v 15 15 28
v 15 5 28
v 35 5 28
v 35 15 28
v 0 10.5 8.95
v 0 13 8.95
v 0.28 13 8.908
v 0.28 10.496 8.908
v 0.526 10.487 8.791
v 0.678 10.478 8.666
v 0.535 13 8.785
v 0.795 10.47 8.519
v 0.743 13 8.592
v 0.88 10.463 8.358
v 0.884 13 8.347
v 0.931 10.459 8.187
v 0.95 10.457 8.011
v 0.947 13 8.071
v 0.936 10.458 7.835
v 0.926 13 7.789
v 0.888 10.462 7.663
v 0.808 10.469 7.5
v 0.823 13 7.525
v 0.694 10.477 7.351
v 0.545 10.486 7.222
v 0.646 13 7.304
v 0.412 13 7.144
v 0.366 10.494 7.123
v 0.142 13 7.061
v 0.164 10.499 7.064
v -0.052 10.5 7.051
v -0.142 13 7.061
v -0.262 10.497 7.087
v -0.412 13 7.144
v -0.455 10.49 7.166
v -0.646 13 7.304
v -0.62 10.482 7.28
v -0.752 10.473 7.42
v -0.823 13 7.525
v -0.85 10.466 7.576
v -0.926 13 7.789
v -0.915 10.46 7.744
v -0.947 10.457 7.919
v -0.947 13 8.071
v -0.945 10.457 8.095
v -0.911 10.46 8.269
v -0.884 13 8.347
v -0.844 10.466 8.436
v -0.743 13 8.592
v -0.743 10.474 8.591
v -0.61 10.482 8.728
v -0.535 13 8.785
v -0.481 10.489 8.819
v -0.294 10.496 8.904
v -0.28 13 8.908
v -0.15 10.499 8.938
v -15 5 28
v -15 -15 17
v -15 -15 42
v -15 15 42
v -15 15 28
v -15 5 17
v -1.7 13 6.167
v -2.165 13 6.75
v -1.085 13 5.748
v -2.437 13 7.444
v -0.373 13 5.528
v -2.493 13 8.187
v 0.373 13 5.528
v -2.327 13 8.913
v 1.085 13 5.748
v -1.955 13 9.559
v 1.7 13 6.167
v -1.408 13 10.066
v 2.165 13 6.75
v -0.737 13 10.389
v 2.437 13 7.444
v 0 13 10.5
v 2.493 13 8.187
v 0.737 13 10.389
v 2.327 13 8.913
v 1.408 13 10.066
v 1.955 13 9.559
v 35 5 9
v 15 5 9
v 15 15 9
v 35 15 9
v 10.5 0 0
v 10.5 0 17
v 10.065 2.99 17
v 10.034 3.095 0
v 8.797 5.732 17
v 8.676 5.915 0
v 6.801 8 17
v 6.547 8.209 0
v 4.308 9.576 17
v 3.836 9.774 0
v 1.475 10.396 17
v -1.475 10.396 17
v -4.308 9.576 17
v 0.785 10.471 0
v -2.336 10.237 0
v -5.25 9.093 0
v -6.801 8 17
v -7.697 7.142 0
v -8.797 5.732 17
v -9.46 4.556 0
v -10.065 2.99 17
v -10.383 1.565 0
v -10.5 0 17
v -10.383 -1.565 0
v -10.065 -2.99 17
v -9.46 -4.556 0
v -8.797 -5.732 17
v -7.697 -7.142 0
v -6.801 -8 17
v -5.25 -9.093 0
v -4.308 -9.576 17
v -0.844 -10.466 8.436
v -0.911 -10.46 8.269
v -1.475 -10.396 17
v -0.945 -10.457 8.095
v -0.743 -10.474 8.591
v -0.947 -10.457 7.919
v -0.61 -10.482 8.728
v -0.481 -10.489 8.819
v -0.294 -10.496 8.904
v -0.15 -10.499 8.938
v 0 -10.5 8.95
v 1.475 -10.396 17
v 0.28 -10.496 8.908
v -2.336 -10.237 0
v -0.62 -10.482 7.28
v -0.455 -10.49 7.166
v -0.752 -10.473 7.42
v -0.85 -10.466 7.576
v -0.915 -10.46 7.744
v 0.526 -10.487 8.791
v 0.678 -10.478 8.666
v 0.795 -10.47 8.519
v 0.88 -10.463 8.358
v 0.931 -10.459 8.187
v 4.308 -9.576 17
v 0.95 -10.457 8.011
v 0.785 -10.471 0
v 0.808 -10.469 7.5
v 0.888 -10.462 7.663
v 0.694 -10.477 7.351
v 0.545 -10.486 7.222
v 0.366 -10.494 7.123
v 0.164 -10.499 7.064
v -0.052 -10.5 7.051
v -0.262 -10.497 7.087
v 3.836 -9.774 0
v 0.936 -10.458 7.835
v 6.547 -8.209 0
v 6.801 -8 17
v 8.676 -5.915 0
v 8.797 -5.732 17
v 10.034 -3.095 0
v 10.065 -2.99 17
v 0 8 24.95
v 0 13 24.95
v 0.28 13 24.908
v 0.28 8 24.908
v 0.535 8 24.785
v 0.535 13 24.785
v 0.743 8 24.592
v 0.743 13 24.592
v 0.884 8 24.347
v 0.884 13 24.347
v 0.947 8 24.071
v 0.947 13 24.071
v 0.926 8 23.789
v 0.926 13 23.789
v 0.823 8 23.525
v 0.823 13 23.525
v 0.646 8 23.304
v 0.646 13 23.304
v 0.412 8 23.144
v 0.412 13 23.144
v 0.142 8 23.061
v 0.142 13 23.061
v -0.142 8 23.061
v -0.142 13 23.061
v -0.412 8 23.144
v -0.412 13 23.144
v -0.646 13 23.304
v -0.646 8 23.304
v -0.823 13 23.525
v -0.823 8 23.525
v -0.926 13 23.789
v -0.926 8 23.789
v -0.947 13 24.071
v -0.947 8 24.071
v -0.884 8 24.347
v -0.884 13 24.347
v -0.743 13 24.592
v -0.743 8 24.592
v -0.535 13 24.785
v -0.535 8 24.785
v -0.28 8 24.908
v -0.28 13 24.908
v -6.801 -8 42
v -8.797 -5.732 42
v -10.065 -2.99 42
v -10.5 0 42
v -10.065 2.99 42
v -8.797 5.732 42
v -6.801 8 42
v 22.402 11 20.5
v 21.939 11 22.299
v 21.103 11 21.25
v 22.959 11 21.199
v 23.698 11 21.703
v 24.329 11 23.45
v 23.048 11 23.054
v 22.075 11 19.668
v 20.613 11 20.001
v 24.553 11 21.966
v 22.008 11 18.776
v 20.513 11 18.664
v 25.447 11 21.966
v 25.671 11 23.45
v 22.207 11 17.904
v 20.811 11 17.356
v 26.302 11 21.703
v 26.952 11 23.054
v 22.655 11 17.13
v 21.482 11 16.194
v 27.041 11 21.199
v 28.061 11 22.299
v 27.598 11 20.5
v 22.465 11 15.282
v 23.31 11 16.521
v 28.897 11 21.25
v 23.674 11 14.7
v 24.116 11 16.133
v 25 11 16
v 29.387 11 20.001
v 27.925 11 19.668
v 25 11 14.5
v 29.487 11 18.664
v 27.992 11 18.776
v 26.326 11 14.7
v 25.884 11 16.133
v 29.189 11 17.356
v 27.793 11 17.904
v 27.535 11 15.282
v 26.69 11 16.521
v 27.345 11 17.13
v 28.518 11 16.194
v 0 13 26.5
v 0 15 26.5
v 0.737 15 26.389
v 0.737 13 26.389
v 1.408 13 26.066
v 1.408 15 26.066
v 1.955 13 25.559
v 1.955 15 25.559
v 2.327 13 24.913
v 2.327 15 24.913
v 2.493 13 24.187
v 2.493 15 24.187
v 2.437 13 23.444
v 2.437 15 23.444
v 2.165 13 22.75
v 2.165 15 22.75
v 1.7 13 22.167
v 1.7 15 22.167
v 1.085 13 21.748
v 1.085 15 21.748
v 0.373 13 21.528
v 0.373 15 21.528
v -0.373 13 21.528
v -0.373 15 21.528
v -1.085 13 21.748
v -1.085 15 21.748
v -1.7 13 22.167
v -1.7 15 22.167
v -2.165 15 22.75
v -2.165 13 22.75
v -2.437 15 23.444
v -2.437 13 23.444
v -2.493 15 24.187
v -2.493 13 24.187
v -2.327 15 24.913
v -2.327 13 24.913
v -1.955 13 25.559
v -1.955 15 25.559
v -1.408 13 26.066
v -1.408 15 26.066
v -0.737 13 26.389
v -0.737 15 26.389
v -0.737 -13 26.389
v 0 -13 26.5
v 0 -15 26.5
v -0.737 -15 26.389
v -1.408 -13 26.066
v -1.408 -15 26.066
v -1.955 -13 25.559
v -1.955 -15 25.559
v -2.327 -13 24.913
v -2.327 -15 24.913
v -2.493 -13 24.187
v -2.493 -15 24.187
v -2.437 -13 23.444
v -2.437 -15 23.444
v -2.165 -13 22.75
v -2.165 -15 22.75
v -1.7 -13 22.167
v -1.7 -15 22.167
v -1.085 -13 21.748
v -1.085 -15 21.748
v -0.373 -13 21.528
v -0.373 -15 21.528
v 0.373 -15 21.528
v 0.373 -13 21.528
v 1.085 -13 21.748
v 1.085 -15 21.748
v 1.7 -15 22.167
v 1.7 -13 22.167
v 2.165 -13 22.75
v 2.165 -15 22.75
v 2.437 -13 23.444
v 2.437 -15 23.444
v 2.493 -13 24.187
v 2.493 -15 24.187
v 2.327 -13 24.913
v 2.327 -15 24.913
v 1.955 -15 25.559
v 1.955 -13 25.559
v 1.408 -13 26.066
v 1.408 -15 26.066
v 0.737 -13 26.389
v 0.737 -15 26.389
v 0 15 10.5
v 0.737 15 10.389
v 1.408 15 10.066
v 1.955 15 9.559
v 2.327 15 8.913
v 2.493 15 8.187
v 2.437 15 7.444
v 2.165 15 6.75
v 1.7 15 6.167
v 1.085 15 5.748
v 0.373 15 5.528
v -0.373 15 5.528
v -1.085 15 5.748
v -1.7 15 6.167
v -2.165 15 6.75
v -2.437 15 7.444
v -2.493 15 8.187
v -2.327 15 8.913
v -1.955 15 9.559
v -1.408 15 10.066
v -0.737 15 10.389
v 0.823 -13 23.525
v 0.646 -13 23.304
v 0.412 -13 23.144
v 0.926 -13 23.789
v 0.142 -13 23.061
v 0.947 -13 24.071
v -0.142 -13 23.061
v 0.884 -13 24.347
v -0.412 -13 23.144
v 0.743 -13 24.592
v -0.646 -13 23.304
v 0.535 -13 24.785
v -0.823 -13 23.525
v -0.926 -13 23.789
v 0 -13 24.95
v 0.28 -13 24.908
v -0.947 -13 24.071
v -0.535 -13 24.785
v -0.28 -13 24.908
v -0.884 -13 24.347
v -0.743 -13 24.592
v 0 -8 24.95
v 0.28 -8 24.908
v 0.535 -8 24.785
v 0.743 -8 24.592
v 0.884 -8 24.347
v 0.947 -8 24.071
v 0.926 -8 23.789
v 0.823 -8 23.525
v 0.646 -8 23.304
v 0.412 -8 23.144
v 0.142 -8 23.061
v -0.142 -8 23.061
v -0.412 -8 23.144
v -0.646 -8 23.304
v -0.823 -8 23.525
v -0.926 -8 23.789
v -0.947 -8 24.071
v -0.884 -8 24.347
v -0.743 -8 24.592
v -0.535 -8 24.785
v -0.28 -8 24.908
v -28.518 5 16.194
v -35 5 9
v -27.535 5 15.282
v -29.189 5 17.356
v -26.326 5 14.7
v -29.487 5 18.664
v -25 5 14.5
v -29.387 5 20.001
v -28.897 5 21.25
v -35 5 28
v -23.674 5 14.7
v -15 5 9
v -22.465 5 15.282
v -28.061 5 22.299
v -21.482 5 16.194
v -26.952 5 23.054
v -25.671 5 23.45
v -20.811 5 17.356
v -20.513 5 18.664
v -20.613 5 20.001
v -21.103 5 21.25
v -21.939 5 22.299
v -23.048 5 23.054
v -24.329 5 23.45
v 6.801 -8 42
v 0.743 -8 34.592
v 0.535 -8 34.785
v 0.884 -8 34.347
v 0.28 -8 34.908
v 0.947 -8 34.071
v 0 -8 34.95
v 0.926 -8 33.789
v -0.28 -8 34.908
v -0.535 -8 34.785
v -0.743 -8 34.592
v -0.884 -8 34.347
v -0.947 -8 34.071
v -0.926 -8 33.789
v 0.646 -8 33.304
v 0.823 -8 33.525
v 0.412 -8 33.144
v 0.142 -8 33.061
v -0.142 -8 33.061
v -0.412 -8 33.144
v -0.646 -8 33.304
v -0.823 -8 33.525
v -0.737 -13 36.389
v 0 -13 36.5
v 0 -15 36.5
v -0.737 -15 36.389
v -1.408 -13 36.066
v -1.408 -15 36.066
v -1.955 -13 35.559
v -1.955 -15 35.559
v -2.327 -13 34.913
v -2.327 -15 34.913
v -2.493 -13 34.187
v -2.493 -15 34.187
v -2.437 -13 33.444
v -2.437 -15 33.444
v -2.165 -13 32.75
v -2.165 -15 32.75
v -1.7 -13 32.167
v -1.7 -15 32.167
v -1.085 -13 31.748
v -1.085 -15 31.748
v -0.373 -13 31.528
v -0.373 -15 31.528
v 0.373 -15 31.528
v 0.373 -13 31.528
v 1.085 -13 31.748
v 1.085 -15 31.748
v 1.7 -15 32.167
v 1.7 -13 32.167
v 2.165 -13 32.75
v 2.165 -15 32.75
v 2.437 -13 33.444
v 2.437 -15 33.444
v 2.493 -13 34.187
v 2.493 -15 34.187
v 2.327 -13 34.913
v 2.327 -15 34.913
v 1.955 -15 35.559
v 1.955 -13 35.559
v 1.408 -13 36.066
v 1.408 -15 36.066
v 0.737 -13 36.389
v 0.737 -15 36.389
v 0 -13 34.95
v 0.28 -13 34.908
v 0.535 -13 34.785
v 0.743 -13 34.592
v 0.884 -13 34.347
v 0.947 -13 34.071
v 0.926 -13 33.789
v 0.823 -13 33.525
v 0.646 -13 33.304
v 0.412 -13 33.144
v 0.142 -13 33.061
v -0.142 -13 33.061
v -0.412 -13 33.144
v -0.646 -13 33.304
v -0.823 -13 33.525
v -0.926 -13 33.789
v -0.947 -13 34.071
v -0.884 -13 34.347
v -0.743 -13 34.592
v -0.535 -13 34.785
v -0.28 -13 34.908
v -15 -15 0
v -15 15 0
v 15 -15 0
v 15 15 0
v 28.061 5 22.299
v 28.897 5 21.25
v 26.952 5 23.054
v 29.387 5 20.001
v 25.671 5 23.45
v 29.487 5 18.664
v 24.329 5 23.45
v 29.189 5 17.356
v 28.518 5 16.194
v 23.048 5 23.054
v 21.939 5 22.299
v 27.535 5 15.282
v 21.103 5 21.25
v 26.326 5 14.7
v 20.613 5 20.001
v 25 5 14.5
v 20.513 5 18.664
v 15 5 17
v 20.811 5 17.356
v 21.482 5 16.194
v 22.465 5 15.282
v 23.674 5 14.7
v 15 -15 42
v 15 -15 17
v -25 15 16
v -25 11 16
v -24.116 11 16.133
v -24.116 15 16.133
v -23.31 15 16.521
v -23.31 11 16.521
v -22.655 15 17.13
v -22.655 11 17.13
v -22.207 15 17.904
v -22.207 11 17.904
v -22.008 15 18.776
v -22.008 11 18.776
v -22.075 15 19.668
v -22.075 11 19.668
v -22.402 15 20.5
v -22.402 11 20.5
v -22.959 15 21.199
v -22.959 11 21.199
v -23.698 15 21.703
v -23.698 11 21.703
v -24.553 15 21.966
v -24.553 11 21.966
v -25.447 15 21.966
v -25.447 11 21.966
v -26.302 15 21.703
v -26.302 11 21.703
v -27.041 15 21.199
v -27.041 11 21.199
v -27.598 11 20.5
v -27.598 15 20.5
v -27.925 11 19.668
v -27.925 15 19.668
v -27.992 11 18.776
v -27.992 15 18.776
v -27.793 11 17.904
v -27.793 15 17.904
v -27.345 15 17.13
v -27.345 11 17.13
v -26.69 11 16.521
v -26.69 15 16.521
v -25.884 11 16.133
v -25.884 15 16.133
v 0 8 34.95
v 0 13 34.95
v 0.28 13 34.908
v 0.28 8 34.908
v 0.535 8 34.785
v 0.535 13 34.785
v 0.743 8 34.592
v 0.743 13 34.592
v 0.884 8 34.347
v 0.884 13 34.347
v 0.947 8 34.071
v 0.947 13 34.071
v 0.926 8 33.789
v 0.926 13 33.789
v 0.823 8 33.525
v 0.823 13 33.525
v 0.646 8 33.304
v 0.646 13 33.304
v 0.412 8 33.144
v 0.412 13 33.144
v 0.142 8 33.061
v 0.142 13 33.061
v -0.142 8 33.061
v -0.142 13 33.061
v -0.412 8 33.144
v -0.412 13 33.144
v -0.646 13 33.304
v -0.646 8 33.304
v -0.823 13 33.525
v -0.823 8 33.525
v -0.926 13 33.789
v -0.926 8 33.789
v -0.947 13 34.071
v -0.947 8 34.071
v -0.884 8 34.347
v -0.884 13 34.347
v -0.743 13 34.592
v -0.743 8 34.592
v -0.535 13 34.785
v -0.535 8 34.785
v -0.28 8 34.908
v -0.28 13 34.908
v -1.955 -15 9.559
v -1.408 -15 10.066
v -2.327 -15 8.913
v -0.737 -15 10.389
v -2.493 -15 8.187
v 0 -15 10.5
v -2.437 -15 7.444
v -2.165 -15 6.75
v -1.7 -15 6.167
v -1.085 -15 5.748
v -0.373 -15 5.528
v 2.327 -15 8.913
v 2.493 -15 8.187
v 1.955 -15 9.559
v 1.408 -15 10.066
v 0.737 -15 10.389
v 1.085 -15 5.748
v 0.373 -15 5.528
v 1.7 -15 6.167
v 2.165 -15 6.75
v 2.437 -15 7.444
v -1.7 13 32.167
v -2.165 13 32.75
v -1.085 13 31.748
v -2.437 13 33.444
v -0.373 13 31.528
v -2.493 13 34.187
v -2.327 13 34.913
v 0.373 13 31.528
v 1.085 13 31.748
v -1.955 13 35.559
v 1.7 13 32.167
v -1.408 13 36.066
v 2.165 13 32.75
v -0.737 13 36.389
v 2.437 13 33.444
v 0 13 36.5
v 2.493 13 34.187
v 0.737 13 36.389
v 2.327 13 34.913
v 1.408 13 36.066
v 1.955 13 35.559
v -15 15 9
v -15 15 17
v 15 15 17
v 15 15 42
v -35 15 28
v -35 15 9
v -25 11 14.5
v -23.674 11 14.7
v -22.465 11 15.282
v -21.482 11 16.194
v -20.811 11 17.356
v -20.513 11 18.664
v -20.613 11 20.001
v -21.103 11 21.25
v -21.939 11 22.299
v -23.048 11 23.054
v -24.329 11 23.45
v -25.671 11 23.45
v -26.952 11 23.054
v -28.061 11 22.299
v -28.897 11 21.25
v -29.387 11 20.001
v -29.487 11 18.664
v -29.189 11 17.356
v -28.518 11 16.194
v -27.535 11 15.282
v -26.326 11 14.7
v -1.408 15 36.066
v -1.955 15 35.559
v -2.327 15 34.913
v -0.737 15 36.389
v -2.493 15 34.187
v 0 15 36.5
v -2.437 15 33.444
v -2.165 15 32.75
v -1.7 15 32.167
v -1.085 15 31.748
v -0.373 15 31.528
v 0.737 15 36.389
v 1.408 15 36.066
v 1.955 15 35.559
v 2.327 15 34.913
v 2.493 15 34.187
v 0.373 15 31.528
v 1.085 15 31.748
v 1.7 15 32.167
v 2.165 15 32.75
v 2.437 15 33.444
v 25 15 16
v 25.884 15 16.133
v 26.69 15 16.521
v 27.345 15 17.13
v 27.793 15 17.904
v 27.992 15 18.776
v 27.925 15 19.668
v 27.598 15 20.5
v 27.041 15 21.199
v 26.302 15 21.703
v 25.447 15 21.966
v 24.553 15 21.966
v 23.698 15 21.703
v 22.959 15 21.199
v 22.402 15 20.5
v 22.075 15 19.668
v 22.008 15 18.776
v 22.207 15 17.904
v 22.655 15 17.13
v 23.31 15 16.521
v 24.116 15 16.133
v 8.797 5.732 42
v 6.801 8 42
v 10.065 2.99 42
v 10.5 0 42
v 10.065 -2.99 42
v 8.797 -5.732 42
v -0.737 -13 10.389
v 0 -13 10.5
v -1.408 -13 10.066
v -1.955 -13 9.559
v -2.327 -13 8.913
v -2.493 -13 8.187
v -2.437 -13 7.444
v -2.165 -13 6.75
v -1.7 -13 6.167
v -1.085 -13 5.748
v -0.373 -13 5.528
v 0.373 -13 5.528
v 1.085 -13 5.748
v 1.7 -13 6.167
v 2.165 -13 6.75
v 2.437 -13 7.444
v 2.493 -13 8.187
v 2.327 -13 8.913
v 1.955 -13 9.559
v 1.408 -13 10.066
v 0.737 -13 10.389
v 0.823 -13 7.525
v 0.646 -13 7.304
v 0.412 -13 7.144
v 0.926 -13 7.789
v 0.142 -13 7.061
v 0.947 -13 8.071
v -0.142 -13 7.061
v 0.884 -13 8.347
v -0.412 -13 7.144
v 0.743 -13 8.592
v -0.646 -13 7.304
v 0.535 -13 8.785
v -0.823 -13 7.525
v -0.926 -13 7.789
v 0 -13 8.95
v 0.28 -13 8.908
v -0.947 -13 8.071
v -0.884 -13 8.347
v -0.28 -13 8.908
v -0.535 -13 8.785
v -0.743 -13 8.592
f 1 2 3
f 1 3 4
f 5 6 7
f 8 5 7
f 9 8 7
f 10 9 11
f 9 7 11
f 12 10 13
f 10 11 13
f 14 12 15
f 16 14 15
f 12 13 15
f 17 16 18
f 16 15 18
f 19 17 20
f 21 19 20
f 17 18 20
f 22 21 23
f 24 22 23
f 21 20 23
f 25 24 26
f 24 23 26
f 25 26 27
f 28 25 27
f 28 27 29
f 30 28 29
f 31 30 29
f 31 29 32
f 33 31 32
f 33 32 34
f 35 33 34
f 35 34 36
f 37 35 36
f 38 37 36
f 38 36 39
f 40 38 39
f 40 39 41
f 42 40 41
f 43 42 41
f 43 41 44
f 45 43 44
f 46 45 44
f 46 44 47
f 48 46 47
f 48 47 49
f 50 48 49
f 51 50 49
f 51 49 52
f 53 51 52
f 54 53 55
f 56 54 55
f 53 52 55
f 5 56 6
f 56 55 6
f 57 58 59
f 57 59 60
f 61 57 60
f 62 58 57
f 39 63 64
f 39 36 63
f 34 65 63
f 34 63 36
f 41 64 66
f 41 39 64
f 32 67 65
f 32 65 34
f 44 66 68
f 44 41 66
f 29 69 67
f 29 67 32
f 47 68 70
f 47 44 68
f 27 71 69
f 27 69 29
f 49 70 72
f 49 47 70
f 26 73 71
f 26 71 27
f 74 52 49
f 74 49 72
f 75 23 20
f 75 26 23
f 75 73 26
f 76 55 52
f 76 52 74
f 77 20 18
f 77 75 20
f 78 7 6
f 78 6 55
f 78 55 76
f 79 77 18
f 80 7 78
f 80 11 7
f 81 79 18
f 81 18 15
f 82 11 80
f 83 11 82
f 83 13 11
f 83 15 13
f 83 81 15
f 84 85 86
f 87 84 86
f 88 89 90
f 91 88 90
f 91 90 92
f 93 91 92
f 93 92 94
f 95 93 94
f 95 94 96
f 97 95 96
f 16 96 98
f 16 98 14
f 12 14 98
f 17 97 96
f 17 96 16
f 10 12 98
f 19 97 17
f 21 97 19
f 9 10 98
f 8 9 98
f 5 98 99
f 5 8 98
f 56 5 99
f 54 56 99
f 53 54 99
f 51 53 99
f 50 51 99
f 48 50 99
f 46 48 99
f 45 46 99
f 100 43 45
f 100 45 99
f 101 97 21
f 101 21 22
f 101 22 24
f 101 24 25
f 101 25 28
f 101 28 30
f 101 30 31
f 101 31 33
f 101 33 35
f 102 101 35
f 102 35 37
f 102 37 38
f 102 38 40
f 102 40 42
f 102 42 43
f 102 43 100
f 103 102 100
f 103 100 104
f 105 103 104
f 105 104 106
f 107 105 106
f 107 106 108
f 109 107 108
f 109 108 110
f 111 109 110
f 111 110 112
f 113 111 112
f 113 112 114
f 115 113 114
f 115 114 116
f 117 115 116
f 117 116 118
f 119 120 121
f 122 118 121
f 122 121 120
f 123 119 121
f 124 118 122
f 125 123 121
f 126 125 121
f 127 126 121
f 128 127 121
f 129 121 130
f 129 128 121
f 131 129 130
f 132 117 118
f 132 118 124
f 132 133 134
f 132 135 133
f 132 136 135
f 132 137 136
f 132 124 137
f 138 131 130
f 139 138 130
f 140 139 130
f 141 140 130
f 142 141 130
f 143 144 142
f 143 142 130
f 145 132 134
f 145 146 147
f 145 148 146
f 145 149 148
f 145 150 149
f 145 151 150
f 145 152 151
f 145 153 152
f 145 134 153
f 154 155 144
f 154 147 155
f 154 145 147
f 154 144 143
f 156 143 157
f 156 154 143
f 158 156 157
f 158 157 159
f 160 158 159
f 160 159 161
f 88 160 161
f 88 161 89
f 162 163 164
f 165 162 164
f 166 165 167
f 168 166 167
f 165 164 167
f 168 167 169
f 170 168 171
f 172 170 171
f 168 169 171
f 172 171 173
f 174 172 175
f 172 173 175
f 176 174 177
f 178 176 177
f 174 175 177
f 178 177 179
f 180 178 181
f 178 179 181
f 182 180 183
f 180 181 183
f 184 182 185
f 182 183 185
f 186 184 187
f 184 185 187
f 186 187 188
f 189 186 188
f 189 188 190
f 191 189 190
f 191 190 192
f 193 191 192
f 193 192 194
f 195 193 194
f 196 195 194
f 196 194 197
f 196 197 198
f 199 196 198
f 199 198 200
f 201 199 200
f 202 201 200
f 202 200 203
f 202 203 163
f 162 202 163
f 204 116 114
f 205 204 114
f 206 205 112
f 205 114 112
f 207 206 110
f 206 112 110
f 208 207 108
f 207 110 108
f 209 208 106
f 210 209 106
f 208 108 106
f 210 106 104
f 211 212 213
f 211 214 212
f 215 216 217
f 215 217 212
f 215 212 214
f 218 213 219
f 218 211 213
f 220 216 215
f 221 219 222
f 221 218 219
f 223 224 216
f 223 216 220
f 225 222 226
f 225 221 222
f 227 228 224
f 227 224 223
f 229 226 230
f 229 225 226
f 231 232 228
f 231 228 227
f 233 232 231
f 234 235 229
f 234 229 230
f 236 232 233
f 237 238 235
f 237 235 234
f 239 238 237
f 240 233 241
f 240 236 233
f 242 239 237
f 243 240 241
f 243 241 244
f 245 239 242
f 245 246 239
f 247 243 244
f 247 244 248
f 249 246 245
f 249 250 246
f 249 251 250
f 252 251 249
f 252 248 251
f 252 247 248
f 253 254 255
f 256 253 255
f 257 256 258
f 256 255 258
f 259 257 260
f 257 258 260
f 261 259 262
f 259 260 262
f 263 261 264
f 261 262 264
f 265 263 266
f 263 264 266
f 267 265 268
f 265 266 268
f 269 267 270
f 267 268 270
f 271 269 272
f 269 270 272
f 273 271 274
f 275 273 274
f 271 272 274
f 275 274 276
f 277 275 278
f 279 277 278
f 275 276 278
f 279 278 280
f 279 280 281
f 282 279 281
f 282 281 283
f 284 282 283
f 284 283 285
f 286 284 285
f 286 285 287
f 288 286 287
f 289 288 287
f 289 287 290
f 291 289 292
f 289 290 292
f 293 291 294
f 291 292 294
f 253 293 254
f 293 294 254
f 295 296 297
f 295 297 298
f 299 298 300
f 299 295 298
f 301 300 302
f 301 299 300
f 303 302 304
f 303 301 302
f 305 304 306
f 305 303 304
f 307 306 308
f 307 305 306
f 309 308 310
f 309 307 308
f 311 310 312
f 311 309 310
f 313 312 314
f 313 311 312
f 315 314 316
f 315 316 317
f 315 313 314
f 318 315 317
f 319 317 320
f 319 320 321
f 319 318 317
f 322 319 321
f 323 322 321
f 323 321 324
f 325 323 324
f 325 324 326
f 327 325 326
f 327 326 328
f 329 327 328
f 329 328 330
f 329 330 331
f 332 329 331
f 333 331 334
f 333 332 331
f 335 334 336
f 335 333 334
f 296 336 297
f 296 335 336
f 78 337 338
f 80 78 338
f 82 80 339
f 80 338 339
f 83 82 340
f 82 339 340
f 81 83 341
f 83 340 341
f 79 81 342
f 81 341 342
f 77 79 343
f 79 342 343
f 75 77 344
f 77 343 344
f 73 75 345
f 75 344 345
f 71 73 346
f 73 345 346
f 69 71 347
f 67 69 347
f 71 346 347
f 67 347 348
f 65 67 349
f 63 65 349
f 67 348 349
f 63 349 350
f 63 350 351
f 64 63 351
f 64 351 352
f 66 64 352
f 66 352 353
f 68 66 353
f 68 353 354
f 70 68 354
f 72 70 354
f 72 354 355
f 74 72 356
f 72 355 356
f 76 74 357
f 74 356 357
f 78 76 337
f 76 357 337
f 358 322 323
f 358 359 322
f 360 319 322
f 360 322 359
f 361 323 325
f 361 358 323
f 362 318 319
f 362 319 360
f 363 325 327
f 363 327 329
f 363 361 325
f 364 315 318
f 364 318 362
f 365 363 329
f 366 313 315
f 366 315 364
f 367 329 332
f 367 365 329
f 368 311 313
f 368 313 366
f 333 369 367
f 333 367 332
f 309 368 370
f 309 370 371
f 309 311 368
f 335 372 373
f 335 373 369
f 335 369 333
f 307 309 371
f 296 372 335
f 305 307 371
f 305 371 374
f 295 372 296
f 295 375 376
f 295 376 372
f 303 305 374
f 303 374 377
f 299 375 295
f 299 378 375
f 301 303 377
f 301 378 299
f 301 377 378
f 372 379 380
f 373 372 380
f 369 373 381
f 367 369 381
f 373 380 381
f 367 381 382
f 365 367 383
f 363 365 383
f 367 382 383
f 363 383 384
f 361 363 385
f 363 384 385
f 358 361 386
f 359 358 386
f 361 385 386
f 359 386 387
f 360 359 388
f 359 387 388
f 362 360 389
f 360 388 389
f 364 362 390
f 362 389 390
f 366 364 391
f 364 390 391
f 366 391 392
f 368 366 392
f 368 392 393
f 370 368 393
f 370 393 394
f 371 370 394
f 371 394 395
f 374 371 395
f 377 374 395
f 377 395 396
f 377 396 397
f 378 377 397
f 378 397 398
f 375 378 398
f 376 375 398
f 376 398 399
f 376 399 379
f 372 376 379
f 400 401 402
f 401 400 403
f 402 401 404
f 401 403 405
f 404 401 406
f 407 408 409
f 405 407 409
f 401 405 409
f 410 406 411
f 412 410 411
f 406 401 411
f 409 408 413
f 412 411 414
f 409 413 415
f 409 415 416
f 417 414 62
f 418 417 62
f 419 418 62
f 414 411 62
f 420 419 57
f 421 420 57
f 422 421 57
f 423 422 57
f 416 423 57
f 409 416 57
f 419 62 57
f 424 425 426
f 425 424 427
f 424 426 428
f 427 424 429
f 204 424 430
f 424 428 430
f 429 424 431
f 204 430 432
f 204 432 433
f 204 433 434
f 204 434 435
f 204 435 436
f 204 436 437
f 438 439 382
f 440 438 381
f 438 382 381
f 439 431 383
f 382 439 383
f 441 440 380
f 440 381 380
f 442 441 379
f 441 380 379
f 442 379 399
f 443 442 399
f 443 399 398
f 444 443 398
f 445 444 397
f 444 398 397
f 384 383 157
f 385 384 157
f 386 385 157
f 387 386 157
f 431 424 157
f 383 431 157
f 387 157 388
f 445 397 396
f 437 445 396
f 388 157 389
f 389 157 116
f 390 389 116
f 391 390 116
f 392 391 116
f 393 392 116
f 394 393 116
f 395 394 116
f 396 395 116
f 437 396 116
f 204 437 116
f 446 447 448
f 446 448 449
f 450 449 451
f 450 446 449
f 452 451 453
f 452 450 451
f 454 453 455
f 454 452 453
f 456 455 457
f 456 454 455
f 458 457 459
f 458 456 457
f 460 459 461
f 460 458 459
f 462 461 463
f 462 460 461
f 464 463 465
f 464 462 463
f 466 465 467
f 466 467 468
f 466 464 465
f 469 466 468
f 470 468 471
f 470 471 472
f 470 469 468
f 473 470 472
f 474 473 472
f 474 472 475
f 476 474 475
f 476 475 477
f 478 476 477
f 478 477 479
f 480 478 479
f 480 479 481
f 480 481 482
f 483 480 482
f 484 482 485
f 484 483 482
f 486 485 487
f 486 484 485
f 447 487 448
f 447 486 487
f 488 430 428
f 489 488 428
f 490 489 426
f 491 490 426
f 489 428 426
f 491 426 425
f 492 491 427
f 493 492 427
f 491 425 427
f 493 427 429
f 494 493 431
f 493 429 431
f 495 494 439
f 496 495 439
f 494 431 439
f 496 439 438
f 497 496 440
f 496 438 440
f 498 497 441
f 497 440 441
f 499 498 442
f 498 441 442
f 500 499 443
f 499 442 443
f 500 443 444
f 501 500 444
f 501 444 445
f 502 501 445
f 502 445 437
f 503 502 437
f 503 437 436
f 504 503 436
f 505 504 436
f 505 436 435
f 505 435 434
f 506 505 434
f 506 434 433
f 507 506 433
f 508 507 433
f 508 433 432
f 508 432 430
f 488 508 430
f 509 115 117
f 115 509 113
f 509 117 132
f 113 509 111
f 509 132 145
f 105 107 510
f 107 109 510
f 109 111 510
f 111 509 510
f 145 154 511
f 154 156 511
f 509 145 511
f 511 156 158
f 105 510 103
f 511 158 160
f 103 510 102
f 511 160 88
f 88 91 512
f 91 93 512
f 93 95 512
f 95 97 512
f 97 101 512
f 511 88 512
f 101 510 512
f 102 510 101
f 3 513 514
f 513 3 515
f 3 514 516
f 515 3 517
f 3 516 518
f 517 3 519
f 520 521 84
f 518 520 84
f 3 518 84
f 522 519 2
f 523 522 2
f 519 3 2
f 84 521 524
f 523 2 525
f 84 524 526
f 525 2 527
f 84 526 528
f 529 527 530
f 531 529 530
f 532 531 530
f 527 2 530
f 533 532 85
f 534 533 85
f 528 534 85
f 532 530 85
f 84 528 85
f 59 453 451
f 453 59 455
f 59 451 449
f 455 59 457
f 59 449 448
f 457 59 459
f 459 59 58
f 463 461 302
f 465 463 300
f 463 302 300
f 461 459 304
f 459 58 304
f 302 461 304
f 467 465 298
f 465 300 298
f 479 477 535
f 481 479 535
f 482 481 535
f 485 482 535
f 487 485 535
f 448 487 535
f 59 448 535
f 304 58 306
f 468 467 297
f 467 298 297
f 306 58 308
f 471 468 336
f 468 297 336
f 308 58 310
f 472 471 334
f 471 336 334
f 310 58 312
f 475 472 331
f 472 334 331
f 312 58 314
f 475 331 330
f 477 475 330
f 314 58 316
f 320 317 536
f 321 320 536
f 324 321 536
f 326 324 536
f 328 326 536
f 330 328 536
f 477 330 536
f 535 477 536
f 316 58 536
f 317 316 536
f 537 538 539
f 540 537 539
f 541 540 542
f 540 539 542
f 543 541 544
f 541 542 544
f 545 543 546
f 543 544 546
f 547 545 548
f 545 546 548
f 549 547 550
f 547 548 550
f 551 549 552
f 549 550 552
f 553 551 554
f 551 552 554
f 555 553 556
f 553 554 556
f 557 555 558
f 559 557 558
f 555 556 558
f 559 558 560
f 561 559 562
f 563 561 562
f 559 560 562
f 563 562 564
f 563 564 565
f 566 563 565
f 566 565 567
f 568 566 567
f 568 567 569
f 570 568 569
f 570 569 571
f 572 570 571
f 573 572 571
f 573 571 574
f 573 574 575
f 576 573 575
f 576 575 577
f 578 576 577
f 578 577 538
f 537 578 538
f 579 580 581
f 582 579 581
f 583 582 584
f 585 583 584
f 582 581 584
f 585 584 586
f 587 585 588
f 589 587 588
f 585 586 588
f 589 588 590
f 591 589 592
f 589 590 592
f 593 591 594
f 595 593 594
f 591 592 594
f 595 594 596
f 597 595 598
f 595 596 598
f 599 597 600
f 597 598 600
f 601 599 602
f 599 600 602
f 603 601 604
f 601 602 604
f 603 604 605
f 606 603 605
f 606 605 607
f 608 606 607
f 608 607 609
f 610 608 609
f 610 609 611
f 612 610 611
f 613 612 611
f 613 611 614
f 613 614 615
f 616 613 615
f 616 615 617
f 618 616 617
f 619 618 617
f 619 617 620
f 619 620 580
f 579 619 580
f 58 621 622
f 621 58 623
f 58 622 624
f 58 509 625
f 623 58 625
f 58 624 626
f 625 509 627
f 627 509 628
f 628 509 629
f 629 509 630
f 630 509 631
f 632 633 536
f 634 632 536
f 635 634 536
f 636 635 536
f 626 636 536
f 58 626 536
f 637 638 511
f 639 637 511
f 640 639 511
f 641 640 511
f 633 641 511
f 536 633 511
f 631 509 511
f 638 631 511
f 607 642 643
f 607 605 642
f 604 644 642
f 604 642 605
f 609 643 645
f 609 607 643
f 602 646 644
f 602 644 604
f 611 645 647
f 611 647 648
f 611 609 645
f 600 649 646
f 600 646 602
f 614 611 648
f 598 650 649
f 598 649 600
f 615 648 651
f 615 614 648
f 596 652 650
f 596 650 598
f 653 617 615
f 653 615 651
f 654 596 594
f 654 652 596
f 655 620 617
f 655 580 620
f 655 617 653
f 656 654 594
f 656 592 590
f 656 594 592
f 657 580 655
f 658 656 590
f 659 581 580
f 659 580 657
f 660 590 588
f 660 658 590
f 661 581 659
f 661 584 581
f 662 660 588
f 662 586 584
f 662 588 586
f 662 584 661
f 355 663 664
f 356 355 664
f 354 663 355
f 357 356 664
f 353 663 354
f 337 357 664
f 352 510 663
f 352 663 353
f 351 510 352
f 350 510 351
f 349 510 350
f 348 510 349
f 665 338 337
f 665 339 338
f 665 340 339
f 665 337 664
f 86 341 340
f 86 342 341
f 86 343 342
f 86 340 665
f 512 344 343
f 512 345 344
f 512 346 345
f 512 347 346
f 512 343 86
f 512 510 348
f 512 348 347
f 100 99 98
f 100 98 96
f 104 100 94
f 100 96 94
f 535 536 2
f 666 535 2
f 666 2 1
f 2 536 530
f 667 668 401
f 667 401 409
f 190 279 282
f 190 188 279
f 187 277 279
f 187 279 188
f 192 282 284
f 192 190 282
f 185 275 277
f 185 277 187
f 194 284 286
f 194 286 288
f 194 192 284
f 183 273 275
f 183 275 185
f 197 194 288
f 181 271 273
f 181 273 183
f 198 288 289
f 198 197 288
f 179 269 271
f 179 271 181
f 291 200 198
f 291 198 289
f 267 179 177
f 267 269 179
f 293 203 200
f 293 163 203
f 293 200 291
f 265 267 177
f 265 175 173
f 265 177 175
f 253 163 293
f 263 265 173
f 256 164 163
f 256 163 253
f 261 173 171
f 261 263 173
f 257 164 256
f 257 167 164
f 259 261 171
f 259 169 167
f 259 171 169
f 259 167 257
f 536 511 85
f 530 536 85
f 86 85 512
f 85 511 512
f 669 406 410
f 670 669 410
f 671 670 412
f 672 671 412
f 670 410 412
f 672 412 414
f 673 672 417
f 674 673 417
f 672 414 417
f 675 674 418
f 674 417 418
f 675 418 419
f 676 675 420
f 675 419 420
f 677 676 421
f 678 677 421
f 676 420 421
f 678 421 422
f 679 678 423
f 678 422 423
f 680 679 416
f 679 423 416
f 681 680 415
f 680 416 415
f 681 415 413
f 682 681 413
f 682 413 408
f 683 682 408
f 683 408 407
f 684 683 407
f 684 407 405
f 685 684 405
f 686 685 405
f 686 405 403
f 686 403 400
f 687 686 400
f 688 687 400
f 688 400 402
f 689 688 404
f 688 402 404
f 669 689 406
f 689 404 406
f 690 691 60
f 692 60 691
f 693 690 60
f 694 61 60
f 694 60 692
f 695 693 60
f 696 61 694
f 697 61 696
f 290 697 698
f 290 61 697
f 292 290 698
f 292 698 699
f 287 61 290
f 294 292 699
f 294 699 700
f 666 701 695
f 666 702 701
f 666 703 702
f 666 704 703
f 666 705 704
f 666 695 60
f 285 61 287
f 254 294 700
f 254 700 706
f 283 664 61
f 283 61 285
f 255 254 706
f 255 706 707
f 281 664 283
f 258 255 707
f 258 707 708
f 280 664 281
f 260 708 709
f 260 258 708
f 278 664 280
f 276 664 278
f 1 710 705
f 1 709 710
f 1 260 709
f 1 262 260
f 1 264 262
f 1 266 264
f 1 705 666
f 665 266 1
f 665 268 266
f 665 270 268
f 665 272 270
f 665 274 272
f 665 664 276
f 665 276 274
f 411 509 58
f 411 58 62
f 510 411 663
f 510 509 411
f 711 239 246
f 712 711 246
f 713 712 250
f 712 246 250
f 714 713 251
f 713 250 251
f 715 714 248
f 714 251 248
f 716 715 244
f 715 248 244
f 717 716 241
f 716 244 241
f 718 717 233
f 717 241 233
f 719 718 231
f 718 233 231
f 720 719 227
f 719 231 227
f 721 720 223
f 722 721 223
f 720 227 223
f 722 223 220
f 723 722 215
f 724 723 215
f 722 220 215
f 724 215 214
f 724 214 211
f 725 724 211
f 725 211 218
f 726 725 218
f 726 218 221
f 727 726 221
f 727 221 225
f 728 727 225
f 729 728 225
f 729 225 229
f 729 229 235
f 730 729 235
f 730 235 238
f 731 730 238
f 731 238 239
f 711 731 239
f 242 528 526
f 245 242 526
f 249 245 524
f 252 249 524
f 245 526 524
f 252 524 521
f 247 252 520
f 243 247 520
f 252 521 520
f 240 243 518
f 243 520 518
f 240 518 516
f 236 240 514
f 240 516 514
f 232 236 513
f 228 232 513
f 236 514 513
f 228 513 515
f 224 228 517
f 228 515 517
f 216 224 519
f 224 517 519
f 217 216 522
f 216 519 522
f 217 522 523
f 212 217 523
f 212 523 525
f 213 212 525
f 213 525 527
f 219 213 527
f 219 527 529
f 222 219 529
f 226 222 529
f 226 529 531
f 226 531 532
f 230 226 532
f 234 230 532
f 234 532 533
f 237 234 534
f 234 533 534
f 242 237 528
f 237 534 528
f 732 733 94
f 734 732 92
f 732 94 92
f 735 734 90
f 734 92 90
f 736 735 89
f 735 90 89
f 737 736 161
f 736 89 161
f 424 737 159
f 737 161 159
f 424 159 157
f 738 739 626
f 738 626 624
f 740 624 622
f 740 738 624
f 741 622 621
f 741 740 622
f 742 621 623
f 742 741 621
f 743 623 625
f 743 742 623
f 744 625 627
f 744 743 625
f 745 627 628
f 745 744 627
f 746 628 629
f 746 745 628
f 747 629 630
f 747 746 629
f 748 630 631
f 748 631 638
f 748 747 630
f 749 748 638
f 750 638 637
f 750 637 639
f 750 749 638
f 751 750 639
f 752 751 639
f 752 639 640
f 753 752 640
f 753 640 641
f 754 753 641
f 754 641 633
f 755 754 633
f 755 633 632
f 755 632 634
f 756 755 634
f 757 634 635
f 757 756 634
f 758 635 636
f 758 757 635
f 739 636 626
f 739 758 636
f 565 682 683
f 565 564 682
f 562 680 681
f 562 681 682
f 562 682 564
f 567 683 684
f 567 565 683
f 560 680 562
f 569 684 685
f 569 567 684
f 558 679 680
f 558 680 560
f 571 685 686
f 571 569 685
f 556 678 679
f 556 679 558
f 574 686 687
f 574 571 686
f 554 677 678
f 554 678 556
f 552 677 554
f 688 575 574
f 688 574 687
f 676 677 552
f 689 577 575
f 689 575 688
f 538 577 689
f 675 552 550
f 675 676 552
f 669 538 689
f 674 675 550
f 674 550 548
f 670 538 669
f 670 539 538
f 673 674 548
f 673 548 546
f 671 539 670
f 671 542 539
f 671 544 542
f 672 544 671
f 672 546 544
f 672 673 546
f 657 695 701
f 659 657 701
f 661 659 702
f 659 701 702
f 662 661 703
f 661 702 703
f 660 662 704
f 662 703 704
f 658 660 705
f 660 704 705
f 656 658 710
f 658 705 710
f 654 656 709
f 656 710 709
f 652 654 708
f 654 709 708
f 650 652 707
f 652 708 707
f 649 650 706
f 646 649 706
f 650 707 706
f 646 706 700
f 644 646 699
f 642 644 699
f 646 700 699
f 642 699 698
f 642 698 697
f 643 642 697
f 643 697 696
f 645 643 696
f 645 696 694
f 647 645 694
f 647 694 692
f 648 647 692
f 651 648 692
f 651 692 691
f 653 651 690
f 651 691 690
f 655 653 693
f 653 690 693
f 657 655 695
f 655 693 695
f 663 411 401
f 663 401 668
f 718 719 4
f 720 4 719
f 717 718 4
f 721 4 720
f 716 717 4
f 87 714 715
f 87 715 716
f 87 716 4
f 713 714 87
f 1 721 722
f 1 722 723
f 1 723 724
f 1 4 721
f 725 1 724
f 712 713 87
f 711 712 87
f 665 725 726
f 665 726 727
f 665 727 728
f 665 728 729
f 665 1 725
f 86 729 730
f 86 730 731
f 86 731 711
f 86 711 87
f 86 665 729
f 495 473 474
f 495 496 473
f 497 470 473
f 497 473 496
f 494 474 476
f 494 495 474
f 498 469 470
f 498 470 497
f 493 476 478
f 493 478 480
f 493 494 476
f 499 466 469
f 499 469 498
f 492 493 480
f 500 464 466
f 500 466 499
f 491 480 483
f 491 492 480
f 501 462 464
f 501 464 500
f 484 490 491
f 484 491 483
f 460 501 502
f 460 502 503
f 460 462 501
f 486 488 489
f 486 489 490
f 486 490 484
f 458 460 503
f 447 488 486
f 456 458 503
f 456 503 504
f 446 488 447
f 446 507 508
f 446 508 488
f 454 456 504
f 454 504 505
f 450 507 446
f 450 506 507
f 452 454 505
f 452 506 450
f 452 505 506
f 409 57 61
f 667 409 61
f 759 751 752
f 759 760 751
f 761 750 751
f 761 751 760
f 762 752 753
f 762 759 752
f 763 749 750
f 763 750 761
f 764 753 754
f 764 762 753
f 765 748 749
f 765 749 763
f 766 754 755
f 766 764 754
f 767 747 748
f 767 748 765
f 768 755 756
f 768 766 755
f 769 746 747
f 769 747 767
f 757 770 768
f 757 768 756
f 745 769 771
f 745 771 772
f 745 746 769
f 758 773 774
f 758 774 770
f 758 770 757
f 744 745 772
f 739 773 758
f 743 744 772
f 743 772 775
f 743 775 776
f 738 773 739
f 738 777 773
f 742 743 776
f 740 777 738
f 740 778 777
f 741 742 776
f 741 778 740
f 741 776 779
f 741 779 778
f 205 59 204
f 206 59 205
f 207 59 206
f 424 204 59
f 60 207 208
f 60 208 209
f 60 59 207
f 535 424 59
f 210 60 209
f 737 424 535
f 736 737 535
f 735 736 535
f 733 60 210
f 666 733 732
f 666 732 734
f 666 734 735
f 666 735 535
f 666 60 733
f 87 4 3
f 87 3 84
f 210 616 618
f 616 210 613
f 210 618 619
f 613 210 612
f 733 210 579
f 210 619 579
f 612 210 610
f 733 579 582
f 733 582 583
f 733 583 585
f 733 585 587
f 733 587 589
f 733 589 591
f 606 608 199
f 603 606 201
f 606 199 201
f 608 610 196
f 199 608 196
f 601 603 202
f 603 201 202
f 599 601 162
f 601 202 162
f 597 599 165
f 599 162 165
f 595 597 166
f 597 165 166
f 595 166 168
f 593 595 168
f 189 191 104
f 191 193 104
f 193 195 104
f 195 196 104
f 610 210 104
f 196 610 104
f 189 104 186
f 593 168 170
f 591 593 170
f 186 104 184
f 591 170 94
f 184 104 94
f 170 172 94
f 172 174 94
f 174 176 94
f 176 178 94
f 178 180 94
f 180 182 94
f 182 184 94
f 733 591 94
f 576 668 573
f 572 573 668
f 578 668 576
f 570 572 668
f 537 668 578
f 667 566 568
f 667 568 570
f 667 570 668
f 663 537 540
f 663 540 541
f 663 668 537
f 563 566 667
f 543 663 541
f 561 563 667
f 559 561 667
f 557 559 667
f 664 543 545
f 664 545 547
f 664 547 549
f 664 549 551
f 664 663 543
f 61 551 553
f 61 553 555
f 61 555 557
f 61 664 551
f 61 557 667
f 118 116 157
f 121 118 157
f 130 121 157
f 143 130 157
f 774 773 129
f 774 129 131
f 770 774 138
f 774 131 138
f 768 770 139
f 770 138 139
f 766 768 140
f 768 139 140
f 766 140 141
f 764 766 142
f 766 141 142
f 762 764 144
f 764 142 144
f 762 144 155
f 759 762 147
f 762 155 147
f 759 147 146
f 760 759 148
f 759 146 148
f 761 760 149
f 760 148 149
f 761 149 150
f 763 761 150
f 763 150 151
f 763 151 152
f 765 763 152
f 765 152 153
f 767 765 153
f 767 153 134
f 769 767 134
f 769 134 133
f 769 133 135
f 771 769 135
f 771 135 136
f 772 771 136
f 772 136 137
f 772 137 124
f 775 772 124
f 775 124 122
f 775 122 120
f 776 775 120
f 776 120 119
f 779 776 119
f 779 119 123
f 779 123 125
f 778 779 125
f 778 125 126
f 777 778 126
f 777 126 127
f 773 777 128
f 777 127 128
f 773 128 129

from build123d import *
from build123d.topology import SkipClean

# Parameters (mm, degrees)
SKETCH_1_W          = 30
SKETCH_1_H          = 30
SKETCH_1_R          = 10.5
EXTRUDE_1_DEPTH     = 17
SKETCH_2_W          = 30
SKETCH_2_H          = 30
EXTRUDE_2_DEPTH     = 25
SKETCH_3_R          = 0.95
CUT_EXTRUDE_1_DEPTH = 54.749418602
SKETCH_4_R          = 2.5
CUT_EXTRUDE_2_DEPTH = 2
CUT_EXTRUDE_START   = -2
SKETCH_5_R          = 2.5
CUT_EXTRUDE_3_DEPTH = 2
SKETCH_6_W          = 19
SKETCH_6_H          = 10
EXTRUDE_5_DEPTH     = 20
SKETCH_8_W          = 19
SKETCH_8_H          = 10
EXTRUDE_6_DEPTH     = 20
SKETCH_9_R          = 3
CUT_EXTRUDE_4_DEPTH = 10
SKETCH_10_R         = 4.5
CUT_EXTRUDE_5_DEPTH = 6


with BuildPart() as part:
    # 草图1 → 凸台-拉伸1 (new body)
    with BuildSketch(Plane.XY):
        Rectangle(SKETCH_1_W, SKETCH_1_H)
        Circle(SKETCH_1_R, mode=Mode.SUBTRACT)
    extrude(amount=EXTRUDE_1_DEPTH)

    # 草图2 → 凸台-拉伸2 (add)
    with SkipClean():  # the faces are left unmerged after this step: merging them gives an invalid solid
        with BuildSketch(Plane.XY.offset(17)):
            Rectangle(SKETCH_2_W, SKETCH_2_H)
            with BuildLine():
                Line((-6.800735254, 8), (6.800735254, 8))
                ThreePointArc((6.800735254, 8), (10.5, 0), (6.800735254, -8))
                Line((6.800735254, -8), (-6.800735254, -8))
                ThreePointArc((-6.800735254, -8), (-10.5, 0), (-6.800735254, 8))
            make_face(mode=Mode.SUBTRACT)
        extrude(amount=EXTRUDE_2_DEPTH)

    # 草图3 → 切除-拉伸1 (cut, through all)
    with SkipClean():  # the faces are left unmerged after this step: merging them gives an invalid solid
        with BuildSketch(Plane(origin=(0, 15, 0), x_dir=(1, 0, 0), z_dir=(0, 1, 0))):
            with Locations(Location((0, -34, 0), (0, 0, 270))):
                Circle(SKETCH_3_R)
            with Locations(Location((0, -8, 0), (0, 0, 270))):
                Circle(SKETCH_3_R)
            with Locations(Location((0, -24, 0), (0, 0, 270))):
                Circle(SKETCH_3_R)
        extrude(amount=-CUT_EXTRUDE_1_DEPTH, mode=Mode.SUBTRACT)

    # 草图4 → 切除-拉伸2 (cut)
    with SkipClean():  # the faces are left unmerged after this step: merging them gives an invalid solid
        with BuildSketch(Plane(origin=(0, 15, 0), x_dir=(1, 0, 0), z_dir=(0, 1, 0))):
            with Locations(Location((0, -8, 0), (0, 0, 270))):
                Circle(SKETCH_4_R)
            with Locations(Location((0, -24, 0), (0, 0, 270))):
                Circle(SKETCH_4_R)
            with Locations(Location((0, -34, 0), (0, 0, 270))):
                Circle(SKETCH_4_R)
        extrude(amount=-CUT_EXTRUDE_2_DEPTH, mode=Mode.SUBTRACT)

    # 草图5 → 切除-拉伸3 (cut)
    with SkipClean():  # the faces are left unmerged after this step: merging them gives an invalid solid
        with BuildSketch(Plane.XZ.offset(15).offset(CUT_EXTRUDE_START)):
            with Locations(Location((0, 34, 0), (0, 0, 90))):
                Circle(SKETCH_5_R)
            with Locations(Location((0, 24, 0), (0, 0, 90))):
                Circle(SKETCH_5_R)
            with Locations(Location((0, 8, 0), (0, 0, 90))):
                Circle(SKETCH_5_R)
        extrude(amount=CUT_EXTRUDE_3_DEPTH, mode=Mode.SUBTRACT)

    # 草图6 → 凸台-拉伸5 (add)
    with SkipClean():  # the faces are left unmerged after this step: merging them gives an invalid solid
        with BuildSketch(Plane.ZY.offset(15)):
            with Locations((18.5, 10)):
                Rectangle(SKETCH_6_W, SKETCH_6_H)
        extrude(amount=EXTRUDE_5_DEPTH)

    # 草图8 → 凸台-拉伸6 (add)
    with SkipClean():  # the faces are left unmerged after this step: merging them gives an invalid solid
        with BuildSketch(Plane(origin=(15, 0, 0), x_dir=(0, 0, -1), z_dir=(1, 0, 0))):
            with Locations((-18.5, 10)):
                Rectangle(SKETCH_8_W, SKETCH_8_H)
        extrude(amount=EXTRUDE_6_DEPTH)

    # 草图9 → 切除-拉伸4 (cut)
    with SkipClean():  # the faces are left unmerged after this step: merging them gives an invalid solid
        with BuildSketch(Plane.XZ.offset(-5)):
            with Locations(Location((-25, 19, 0), (0, 0, 270))):
                Circle(SKETCH_9_R)
            with Locations(Location((25, 19, 0), (0, 0, 270))):
                Circle(SKETCH_9_R)
        extrude(amount=-CUT_EXTRUDE_4_DEPTH, mode=Mode.SUBTRACT)

    # 草图10 → 切除-拉伸5 (cut)
    with SkipClean():  # the faces are left unmerged after this step: merging them gives an invalid solid
        with BuildSketch(Plane.XZ.offset(-5)):
            with Locations(Location((-25, 19, 0), (0, 0, 270))):
                Circle(SKETCH_10_R)
            with Locations(Location((25, 19, 0), (0, 0, 270))):
                Circle(SKETCH_10_R)
        extrude(amount=-CUT_EXTRUDE_5_DEPTH, mode=Mode.SUBTRACT)


solid = part.part
